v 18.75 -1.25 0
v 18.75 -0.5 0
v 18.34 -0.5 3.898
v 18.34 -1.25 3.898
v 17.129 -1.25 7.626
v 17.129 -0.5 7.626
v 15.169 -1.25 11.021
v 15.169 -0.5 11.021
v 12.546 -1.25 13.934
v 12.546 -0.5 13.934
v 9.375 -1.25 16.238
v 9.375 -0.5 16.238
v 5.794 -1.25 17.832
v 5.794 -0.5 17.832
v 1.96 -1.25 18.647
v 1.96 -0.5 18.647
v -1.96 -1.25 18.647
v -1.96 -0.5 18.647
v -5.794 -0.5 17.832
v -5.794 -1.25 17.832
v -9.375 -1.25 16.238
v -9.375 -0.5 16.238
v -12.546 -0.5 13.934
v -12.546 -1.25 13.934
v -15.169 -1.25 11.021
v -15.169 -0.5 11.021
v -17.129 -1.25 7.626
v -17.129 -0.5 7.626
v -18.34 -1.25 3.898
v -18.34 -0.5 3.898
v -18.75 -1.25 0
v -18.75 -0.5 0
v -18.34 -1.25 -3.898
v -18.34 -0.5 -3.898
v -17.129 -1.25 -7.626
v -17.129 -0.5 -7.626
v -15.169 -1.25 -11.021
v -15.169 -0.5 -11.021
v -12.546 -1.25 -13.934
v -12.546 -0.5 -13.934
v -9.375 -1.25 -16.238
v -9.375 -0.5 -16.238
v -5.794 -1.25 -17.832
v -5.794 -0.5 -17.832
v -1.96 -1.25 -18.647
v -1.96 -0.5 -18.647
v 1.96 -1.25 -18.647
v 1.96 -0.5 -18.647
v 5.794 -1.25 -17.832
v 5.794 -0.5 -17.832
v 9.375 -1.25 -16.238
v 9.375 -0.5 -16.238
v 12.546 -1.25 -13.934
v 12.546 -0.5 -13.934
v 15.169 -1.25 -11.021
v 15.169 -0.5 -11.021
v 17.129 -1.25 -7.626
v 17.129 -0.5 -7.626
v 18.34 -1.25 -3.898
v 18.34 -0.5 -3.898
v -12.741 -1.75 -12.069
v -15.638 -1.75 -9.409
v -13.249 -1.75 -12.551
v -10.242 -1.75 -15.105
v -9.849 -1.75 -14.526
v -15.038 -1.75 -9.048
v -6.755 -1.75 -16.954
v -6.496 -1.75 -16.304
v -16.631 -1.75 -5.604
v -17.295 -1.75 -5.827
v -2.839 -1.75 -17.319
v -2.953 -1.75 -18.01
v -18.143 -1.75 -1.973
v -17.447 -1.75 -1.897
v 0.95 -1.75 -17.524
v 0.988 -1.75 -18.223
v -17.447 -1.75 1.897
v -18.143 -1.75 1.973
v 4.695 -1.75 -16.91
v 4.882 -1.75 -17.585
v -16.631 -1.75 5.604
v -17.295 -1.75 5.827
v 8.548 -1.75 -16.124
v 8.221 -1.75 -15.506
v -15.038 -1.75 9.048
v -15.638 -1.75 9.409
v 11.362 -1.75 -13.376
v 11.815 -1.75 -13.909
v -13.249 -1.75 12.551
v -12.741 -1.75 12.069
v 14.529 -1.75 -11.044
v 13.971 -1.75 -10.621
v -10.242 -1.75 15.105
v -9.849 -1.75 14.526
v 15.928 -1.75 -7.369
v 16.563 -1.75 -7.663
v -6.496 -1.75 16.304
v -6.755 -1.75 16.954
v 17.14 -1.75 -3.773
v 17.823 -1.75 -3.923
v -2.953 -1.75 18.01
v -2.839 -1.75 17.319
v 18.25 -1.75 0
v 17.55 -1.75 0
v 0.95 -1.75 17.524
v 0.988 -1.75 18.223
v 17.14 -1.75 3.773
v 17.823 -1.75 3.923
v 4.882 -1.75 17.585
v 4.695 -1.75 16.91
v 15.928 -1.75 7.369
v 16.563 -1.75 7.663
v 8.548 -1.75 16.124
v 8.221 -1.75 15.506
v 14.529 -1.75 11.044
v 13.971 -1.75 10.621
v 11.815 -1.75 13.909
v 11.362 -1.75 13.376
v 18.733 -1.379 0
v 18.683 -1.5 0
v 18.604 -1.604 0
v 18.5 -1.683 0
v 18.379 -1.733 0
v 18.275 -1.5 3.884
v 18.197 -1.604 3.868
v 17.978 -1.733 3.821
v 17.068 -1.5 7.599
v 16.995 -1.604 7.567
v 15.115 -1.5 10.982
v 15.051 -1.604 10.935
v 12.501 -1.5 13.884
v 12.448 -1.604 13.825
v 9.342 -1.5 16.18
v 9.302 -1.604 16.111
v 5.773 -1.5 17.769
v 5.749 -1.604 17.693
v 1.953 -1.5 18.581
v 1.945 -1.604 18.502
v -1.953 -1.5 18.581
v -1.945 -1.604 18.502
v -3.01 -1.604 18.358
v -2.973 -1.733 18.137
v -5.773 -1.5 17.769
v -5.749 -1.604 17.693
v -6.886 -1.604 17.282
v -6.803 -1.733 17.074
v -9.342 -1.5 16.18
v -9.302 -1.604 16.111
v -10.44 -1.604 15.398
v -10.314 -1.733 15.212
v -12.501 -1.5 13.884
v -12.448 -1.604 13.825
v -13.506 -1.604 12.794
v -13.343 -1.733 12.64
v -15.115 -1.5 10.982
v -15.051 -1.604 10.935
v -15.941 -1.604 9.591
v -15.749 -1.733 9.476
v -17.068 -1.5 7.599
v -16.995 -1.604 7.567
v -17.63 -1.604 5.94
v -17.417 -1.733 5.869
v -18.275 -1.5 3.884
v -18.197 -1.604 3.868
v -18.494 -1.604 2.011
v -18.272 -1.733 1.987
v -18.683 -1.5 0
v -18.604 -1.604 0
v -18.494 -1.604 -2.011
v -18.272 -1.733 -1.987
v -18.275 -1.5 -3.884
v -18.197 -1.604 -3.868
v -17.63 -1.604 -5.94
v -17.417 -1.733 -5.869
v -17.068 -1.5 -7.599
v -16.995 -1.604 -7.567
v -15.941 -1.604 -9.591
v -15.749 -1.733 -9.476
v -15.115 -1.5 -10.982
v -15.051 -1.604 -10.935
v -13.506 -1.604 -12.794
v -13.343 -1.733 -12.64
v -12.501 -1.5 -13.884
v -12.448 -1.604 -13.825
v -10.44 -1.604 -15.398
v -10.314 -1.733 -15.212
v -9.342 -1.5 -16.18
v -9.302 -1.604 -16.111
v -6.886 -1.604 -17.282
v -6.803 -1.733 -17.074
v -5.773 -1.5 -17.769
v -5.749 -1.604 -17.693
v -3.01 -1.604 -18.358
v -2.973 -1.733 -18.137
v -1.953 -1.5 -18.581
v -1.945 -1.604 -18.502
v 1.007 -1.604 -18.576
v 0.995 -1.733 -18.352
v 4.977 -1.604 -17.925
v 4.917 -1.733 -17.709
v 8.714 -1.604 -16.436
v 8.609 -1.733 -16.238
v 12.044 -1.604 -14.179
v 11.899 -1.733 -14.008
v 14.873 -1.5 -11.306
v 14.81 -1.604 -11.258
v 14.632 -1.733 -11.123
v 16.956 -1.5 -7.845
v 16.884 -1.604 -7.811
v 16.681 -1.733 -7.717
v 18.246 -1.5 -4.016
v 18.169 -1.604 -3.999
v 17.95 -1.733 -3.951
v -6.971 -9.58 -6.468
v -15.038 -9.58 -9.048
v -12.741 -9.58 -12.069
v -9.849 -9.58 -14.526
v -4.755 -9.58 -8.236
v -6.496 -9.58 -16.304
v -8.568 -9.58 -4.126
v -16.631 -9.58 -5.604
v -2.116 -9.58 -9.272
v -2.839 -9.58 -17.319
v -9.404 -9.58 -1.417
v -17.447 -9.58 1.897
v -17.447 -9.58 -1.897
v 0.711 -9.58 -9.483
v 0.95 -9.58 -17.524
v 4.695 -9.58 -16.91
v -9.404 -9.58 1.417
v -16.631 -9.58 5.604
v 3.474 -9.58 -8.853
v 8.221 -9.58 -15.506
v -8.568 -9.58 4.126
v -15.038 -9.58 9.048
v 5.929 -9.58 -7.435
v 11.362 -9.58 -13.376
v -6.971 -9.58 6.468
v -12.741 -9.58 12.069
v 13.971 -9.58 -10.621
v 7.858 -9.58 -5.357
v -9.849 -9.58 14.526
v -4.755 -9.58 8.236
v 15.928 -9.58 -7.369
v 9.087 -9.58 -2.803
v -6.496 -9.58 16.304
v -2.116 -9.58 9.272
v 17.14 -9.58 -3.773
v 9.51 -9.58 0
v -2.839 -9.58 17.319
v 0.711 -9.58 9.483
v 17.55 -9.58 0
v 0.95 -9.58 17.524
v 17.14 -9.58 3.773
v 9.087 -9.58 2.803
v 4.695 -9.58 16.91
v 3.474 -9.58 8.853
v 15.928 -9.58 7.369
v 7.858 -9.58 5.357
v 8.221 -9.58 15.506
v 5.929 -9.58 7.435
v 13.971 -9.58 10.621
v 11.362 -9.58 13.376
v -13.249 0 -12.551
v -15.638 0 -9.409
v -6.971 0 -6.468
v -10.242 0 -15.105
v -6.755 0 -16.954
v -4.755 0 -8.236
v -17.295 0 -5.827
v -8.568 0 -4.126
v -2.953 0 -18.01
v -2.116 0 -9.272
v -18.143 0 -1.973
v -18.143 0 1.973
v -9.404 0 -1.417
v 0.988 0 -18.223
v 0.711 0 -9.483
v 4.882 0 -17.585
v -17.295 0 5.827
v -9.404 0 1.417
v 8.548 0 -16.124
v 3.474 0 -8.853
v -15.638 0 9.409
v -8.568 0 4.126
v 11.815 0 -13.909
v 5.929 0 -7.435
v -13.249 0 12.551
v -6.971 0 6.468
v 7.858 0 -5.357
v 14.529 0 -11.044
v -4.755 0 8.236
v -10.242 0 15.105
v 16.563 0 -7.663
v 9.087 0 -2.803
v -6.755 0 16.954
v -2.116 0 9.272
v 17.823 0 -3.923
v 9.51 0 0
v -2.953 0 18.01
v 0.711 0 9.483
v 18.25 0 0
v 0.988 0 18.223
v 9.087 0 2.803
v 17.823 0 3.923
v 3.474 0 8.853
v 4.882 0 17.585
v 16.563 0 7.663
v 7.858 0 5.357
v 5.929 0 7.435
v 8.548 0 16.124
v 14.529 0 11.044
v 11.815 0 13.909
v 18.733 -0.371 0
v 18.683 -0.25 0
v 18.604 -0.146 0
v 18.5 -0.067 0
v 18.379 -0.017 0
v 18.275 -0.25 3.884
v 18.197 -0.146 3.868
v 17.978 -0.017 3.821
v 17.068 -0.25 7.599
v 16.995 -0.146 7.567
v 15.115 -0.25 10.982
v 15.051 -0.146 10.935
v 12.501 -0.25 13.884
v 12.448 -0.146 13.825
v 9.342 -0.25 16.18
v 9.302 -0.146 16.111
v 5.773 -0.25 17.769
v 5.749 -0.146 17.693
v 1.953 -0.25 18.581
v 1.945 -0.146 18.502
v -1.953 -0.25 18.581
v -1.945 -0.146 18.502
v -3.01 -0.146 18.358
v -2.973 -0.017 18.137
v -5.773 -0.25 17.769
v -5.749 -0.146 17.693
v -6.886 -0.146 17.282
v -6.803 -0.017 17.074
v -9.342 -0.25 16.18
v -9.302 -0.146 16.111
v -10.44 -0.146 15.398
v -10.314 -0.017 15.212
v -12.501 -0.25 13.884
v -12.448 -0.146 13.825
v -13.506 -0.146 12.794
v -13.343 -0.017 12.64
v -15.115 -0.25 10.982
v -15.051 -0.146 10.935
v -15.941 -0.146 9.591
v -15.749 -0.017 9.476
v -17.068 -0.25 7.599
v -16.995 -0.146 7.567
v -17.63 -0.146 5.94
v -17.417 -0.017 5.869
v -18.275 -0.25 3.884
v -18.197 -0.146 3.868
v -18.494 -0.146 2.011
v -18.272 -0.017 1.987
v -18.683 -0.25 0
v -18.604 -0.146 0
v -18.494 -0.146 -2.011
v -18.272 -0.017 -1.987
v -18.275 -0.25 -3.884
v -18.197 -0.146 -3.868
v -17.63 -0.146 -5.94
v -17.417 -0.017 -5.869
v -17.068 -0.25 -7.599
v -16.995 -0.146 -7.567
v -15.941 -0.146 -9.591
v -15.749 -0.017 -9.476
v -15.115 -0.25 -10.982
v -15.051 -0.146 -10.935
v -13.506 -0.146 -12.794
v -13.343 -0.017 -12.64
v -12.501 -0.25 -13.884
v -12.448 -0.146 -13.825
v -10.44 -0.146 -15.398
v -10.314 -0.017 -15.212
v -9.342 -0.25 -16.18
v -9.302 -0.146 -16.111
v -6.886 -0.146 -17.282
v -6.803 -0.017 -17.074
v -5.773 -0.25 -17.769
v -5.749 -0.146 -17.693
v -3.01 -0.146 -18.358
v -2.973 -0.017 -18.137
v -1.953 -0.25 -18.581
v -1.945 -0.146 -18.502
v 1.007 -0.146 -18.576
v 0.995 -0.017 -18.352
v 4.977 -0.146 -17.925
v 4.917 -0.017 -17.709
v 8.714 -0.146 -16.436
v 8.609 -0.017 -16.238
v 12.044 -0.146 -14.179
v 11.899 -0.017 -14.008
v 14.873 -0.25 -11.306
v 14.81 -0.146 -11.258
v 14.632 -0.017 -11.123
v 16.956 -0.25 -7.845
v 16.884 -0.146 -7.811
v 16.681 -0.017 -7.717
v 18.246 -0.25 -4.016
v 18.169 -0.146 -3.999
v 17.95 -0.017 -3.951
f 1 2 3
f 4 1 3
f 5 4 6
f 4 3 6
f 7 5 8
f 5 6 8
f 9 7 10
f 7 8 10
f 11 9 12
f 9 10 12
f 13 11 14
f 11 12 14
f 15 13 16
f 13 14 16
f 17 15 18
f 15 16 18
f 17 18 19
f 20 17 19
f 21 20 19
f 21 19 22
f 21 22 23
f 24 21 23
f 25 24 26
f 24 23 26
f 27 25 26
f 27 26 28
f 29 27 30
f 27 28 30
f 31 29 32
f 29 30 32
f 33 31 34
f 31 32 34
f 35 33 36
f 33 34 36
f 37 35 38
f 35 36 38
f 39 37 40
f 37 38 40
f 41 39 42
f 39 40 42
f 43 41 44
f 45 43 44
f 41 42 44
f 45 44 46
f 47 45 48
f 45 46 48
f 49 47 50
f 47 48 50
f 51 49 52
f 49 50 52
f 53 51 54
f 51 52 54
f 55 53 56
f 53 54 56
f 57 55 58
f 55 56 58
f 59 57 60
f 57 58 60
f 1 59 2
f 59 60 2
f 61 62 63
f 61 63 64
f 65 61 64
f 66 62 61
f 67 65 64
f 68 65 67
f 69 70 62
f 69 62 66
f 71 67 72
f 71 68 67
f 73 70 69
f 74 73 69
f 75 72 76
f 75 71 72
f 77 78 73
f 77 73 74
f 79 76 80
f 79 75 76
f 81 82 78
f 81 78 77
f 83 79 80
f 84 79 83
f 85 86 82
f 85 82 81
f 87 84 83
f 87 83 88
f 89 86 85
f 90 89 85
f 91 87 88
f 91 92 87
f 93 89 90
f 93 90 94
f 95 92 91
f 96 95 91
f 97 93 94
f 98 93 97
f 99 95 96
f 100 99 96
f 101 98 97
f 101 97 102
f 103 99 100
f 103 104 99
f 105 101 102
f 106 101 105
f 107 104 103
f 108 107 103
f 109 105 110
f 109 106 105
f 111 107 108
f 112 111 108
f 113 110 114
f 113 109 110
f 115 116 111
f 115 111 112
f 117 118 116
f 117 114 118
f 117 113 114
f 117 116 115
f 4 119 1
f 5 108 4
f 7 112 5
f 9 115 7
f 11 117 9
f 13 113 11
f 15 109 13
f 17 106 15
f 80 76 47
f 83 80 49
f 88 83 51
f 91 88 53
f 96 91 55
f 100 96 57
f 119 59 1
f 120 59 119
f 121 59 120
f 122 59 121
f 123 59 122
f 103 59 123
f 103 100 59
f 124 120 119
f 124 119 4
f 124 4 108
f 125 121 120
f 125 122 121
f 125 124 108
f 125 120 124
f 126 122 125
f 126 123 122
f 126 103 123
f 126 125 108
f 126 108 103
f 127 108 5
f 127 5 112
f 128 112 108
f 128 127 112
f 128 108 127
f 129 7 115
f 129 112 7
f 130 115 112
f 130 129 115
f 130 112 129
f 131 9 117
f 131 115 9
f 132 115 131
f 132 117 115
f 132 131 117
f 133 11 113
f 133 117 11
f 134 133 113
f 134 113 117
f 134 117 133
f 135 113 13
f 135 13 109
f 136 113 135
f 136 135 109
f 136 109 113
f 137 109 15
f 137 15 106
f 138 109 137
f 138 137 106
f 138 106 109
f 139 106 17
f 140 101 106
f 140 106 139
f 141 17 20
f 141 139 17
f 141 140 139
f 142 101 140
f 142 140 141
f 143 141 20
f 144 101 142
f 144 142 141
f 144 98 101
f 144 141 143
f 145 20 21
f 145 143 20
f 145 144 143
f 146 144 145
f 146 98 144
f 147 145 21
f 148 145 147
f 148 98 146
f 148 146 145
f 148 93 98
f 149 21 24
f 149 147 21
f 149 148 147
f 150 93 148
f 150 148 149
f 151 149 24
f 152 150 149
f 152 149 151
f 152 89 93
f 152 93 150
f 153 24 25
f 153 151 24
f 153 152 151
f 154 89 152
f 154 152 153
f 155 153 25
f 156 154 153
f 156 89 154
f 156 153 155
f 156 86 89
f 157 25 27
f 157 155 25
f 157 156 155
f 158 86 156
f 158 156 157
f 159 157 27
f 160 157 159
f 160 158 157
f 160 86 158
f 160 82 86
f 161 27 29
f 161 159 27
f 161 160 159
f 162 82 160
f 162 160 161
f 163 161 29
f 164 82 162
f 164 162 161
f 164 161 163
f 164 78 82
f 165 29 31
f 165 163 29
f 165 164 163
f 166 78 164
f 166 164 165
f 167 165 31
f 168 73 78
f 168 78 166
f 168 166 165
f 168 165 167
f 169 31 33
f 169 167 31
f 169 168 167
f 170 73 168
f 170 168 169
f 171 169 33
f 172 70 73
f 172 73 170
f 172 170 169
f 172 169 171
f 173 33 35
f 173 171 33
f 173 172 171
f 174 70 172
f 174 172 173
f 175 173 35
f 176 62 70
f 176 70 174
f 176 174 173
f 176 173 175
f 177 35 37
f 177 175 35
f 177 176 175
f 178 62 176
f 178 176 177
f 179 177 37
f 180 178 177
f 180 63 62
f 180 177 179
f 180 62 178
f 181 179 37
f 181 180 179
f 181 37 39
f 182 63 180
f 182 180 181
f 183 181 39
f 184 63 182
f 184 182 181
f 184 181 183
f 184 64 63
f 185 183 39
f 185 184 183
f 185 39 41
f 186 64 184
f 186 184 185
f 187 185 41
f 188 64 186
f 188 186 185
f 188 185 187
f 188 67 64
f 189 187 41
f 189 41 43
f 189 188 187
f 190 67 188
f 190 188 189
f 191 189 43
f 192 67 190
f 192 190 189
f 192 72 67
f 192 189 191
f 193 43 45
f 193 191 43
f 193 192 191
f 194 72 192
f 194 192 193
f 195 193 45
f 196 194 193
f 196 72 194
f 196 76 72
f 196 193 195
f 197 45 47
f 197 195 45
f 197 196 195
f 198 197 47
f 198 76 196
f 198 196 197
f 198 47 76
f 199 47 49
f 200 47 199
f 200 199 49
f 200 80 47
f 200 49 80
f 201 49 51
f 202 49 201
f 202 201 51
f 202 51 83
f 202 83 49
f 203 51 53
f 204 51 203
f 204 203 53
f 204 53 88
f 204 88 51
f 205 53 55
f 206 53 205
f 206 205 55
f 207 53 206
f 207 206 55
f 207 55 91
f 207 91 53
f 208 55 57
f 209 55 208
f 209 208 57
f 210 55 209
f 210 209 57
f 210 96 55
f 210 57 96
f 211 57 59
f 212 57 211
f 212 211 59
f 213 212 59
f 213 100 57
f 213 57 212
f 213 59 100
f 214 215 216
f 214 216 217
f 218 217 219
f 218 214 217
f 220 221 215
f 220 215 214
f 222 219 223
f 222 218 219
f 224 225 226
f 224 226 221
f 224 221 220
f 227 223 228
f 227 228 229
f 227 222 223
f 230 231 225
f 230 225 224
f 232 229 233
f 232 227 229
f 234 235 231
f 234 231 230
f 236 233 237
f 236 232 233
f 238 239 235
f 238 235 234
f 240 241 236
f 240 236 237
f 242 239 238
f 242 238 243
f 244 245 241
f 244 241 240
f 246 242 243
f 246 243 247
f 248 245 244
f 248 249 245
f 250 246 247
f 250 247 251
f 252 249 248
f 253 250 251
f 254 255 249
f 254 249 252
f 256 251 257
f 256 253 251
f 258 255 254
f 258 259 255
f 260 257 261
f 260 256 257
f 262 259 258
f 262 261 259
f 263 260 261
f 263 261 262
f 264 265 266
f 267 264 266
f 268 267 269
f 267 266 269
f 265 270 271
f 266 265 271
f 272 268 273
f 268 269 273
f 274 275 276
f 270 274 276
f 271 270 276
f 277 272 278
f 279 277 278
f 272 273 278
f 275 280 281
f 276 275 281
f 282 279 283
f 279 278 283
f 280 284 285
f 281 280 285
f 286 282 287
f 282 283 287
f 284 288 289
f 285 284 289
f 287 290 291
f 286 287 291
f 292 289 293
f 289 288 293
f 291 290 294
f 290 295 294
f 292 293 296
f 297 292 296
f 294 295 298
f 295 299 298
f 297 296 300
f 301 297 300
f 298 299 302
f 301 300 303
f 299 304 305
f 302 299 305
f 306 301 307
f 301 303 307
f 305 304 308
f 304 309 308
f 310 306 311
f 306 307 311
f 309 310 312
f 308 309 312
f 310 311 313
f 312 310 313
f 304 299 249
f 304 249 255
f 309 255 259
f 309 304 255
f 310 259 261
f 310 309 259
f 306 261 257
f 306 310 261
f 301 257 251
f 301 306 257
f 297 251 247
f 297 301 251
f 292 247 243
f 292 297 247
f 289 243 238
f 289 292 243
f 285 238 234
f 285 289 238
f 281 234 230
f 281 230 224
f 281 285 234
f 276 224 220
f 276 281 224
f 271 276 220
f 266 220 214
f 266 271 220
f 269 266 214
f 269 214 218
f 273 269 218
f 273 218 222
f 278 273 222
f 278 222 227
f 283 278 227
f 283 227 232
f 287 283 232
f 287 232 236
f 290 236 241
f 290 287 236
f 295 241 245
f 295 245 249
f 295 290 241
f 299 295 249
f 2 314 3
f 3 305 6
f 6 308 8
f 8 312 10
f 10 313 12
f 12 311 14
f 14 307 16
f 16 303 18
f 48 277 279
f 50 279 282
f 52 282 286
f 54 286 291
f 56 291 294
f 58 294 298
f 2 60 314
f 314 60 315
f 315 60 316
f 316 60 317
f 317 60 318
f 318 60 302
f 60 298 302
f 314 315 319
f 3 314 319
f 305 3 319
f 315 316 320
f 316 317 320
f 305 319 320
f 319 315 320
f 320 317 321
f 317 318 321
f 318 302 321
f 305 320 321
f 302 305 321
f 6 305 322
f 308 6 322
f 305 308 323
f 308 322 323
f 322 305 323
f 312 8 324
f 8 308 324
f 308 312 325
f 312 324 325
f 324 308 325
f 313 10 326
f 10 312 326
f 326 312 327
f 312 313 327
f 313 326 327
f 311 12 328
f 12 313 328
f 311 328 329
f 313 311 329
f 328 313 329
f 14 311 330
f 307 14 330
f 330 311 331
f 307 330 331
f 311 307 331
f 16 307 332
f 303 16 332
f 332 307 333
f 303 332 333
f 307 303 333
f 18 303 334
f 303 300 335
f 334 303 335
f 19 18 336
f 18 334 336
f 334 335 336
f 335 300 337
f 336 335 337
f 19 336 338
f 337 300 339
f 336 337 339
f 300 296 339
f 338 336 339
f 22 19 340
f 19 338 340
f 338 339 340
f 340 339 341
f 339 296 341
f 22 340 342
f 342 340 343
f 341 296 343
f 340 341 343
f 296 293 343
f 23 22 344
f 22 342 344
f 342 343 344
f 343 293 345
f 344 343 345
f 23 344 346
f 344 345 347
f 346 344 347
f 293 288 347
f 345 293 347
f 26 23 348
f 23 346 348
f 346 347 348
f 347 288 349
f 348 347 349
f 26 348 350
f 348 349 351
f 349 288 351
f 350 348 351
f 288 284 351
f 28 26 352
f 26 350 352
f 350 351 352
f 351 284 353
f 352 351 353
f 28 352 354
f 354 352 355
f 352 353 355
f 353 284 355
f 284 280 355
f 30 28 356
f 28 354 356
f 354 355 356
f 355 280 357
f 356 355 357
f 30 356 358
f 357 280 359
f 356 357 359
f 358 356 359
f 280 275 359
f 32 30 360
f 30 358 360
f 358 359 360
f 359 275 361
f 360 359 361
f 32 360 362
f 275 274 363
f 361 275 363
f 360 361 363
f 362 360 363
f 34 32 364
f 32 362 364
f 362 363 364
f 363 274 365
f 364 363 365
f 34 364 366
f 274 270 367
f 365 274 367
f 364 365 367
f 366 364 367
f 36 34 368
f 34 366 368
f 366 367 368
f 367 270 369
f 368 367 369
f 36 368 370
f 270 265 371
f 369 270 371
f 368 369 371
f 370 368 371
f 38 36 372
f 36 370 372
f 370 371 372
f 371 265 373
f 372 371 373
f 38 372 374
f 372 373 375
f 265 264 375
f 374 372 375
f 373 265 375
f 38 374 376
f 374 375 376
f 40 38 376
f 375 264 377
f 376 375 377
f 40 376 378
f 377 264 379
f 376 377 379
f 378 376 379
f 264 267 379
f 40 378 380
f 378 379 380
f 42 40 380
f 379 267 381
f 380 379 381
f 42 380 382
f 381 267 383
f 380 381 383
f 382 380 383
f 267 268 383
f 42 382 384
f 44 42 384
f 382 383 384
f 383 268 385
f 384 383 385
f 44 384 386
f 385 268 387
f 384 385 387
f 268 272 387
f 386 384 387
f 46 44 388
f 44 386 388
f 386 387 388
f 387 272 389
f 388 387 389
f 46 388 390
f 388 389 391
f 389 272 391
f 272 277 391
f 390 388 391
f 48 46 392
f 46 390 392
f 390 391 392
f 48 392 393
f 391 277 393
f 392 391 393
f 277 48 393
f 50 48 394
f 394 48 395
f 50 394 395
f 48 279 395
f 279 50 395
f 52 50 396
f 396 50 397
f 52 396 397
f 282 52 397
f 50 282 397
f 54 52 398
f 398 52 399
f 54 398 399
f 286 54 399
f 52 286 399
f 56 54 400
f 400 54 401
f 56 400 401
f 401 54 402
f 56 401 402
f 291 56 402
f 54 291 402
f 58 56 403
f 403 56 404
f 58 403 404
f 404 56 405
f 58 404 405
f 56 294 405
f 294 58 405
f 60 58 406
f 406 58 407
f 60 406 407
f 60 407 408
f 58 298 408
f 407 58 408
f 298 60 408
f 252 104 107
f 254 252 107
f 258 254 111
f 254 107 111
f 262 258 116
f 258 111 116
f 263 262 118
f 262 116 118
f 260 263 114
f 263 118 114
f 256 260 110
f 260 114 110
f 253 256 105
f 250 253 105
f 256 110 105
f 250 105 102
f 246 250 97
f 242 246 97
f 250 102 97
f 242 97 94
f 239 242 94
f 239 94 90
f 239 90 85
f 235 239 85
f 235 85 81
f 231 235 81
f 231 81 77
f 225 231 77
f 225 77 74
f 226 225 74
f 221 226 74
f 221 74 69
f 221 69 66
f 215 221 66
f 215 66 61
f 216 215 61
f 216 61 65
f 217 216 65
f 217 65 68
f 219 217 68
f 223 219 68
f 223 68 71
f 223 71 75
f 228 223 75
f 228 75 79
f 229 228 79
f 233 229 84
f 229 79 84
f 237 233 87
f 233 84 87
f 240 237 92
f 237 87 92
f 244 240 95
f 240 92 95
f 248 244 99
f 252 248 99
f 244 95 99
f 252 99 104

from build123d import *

# Parameters (mm, degrees)
F0_R     = 17.55
F0_R_2   = 9.51
F1_DEPTH = 9.58
F2_R     = 18.75
F2_R_2   = 17.55
F3_DEPTH = 1.75
F4_R     = 0.5


with BuildPart() as f1:
    # F0 (on Front) → F1 (new body)
    with BuildSketch(Plane.XZ):
        Circle(F0_R)
        Circle(F0_R_2, mode=Mode.SUBTRACT)
    extrude(amount=F1_DEPTH)

    # F2 (on Front) → F3 (join)
    with BuildSketch(Plane.XZ):
        Circle(F2_R)
        Circle(F2_R_2, mode=Mode.SUBTRACT)
    extrude(amount=F3_DEPTH)

    # F4
    f4_edges = [f1.edges().sort_by_distance(p)[0] for p in [
        (-18.75, -1.75, 0),
        (-18.75, 0, 0),
    ]]
    fillet(f4_edges, radius=F4_R)


solid = f1.part
